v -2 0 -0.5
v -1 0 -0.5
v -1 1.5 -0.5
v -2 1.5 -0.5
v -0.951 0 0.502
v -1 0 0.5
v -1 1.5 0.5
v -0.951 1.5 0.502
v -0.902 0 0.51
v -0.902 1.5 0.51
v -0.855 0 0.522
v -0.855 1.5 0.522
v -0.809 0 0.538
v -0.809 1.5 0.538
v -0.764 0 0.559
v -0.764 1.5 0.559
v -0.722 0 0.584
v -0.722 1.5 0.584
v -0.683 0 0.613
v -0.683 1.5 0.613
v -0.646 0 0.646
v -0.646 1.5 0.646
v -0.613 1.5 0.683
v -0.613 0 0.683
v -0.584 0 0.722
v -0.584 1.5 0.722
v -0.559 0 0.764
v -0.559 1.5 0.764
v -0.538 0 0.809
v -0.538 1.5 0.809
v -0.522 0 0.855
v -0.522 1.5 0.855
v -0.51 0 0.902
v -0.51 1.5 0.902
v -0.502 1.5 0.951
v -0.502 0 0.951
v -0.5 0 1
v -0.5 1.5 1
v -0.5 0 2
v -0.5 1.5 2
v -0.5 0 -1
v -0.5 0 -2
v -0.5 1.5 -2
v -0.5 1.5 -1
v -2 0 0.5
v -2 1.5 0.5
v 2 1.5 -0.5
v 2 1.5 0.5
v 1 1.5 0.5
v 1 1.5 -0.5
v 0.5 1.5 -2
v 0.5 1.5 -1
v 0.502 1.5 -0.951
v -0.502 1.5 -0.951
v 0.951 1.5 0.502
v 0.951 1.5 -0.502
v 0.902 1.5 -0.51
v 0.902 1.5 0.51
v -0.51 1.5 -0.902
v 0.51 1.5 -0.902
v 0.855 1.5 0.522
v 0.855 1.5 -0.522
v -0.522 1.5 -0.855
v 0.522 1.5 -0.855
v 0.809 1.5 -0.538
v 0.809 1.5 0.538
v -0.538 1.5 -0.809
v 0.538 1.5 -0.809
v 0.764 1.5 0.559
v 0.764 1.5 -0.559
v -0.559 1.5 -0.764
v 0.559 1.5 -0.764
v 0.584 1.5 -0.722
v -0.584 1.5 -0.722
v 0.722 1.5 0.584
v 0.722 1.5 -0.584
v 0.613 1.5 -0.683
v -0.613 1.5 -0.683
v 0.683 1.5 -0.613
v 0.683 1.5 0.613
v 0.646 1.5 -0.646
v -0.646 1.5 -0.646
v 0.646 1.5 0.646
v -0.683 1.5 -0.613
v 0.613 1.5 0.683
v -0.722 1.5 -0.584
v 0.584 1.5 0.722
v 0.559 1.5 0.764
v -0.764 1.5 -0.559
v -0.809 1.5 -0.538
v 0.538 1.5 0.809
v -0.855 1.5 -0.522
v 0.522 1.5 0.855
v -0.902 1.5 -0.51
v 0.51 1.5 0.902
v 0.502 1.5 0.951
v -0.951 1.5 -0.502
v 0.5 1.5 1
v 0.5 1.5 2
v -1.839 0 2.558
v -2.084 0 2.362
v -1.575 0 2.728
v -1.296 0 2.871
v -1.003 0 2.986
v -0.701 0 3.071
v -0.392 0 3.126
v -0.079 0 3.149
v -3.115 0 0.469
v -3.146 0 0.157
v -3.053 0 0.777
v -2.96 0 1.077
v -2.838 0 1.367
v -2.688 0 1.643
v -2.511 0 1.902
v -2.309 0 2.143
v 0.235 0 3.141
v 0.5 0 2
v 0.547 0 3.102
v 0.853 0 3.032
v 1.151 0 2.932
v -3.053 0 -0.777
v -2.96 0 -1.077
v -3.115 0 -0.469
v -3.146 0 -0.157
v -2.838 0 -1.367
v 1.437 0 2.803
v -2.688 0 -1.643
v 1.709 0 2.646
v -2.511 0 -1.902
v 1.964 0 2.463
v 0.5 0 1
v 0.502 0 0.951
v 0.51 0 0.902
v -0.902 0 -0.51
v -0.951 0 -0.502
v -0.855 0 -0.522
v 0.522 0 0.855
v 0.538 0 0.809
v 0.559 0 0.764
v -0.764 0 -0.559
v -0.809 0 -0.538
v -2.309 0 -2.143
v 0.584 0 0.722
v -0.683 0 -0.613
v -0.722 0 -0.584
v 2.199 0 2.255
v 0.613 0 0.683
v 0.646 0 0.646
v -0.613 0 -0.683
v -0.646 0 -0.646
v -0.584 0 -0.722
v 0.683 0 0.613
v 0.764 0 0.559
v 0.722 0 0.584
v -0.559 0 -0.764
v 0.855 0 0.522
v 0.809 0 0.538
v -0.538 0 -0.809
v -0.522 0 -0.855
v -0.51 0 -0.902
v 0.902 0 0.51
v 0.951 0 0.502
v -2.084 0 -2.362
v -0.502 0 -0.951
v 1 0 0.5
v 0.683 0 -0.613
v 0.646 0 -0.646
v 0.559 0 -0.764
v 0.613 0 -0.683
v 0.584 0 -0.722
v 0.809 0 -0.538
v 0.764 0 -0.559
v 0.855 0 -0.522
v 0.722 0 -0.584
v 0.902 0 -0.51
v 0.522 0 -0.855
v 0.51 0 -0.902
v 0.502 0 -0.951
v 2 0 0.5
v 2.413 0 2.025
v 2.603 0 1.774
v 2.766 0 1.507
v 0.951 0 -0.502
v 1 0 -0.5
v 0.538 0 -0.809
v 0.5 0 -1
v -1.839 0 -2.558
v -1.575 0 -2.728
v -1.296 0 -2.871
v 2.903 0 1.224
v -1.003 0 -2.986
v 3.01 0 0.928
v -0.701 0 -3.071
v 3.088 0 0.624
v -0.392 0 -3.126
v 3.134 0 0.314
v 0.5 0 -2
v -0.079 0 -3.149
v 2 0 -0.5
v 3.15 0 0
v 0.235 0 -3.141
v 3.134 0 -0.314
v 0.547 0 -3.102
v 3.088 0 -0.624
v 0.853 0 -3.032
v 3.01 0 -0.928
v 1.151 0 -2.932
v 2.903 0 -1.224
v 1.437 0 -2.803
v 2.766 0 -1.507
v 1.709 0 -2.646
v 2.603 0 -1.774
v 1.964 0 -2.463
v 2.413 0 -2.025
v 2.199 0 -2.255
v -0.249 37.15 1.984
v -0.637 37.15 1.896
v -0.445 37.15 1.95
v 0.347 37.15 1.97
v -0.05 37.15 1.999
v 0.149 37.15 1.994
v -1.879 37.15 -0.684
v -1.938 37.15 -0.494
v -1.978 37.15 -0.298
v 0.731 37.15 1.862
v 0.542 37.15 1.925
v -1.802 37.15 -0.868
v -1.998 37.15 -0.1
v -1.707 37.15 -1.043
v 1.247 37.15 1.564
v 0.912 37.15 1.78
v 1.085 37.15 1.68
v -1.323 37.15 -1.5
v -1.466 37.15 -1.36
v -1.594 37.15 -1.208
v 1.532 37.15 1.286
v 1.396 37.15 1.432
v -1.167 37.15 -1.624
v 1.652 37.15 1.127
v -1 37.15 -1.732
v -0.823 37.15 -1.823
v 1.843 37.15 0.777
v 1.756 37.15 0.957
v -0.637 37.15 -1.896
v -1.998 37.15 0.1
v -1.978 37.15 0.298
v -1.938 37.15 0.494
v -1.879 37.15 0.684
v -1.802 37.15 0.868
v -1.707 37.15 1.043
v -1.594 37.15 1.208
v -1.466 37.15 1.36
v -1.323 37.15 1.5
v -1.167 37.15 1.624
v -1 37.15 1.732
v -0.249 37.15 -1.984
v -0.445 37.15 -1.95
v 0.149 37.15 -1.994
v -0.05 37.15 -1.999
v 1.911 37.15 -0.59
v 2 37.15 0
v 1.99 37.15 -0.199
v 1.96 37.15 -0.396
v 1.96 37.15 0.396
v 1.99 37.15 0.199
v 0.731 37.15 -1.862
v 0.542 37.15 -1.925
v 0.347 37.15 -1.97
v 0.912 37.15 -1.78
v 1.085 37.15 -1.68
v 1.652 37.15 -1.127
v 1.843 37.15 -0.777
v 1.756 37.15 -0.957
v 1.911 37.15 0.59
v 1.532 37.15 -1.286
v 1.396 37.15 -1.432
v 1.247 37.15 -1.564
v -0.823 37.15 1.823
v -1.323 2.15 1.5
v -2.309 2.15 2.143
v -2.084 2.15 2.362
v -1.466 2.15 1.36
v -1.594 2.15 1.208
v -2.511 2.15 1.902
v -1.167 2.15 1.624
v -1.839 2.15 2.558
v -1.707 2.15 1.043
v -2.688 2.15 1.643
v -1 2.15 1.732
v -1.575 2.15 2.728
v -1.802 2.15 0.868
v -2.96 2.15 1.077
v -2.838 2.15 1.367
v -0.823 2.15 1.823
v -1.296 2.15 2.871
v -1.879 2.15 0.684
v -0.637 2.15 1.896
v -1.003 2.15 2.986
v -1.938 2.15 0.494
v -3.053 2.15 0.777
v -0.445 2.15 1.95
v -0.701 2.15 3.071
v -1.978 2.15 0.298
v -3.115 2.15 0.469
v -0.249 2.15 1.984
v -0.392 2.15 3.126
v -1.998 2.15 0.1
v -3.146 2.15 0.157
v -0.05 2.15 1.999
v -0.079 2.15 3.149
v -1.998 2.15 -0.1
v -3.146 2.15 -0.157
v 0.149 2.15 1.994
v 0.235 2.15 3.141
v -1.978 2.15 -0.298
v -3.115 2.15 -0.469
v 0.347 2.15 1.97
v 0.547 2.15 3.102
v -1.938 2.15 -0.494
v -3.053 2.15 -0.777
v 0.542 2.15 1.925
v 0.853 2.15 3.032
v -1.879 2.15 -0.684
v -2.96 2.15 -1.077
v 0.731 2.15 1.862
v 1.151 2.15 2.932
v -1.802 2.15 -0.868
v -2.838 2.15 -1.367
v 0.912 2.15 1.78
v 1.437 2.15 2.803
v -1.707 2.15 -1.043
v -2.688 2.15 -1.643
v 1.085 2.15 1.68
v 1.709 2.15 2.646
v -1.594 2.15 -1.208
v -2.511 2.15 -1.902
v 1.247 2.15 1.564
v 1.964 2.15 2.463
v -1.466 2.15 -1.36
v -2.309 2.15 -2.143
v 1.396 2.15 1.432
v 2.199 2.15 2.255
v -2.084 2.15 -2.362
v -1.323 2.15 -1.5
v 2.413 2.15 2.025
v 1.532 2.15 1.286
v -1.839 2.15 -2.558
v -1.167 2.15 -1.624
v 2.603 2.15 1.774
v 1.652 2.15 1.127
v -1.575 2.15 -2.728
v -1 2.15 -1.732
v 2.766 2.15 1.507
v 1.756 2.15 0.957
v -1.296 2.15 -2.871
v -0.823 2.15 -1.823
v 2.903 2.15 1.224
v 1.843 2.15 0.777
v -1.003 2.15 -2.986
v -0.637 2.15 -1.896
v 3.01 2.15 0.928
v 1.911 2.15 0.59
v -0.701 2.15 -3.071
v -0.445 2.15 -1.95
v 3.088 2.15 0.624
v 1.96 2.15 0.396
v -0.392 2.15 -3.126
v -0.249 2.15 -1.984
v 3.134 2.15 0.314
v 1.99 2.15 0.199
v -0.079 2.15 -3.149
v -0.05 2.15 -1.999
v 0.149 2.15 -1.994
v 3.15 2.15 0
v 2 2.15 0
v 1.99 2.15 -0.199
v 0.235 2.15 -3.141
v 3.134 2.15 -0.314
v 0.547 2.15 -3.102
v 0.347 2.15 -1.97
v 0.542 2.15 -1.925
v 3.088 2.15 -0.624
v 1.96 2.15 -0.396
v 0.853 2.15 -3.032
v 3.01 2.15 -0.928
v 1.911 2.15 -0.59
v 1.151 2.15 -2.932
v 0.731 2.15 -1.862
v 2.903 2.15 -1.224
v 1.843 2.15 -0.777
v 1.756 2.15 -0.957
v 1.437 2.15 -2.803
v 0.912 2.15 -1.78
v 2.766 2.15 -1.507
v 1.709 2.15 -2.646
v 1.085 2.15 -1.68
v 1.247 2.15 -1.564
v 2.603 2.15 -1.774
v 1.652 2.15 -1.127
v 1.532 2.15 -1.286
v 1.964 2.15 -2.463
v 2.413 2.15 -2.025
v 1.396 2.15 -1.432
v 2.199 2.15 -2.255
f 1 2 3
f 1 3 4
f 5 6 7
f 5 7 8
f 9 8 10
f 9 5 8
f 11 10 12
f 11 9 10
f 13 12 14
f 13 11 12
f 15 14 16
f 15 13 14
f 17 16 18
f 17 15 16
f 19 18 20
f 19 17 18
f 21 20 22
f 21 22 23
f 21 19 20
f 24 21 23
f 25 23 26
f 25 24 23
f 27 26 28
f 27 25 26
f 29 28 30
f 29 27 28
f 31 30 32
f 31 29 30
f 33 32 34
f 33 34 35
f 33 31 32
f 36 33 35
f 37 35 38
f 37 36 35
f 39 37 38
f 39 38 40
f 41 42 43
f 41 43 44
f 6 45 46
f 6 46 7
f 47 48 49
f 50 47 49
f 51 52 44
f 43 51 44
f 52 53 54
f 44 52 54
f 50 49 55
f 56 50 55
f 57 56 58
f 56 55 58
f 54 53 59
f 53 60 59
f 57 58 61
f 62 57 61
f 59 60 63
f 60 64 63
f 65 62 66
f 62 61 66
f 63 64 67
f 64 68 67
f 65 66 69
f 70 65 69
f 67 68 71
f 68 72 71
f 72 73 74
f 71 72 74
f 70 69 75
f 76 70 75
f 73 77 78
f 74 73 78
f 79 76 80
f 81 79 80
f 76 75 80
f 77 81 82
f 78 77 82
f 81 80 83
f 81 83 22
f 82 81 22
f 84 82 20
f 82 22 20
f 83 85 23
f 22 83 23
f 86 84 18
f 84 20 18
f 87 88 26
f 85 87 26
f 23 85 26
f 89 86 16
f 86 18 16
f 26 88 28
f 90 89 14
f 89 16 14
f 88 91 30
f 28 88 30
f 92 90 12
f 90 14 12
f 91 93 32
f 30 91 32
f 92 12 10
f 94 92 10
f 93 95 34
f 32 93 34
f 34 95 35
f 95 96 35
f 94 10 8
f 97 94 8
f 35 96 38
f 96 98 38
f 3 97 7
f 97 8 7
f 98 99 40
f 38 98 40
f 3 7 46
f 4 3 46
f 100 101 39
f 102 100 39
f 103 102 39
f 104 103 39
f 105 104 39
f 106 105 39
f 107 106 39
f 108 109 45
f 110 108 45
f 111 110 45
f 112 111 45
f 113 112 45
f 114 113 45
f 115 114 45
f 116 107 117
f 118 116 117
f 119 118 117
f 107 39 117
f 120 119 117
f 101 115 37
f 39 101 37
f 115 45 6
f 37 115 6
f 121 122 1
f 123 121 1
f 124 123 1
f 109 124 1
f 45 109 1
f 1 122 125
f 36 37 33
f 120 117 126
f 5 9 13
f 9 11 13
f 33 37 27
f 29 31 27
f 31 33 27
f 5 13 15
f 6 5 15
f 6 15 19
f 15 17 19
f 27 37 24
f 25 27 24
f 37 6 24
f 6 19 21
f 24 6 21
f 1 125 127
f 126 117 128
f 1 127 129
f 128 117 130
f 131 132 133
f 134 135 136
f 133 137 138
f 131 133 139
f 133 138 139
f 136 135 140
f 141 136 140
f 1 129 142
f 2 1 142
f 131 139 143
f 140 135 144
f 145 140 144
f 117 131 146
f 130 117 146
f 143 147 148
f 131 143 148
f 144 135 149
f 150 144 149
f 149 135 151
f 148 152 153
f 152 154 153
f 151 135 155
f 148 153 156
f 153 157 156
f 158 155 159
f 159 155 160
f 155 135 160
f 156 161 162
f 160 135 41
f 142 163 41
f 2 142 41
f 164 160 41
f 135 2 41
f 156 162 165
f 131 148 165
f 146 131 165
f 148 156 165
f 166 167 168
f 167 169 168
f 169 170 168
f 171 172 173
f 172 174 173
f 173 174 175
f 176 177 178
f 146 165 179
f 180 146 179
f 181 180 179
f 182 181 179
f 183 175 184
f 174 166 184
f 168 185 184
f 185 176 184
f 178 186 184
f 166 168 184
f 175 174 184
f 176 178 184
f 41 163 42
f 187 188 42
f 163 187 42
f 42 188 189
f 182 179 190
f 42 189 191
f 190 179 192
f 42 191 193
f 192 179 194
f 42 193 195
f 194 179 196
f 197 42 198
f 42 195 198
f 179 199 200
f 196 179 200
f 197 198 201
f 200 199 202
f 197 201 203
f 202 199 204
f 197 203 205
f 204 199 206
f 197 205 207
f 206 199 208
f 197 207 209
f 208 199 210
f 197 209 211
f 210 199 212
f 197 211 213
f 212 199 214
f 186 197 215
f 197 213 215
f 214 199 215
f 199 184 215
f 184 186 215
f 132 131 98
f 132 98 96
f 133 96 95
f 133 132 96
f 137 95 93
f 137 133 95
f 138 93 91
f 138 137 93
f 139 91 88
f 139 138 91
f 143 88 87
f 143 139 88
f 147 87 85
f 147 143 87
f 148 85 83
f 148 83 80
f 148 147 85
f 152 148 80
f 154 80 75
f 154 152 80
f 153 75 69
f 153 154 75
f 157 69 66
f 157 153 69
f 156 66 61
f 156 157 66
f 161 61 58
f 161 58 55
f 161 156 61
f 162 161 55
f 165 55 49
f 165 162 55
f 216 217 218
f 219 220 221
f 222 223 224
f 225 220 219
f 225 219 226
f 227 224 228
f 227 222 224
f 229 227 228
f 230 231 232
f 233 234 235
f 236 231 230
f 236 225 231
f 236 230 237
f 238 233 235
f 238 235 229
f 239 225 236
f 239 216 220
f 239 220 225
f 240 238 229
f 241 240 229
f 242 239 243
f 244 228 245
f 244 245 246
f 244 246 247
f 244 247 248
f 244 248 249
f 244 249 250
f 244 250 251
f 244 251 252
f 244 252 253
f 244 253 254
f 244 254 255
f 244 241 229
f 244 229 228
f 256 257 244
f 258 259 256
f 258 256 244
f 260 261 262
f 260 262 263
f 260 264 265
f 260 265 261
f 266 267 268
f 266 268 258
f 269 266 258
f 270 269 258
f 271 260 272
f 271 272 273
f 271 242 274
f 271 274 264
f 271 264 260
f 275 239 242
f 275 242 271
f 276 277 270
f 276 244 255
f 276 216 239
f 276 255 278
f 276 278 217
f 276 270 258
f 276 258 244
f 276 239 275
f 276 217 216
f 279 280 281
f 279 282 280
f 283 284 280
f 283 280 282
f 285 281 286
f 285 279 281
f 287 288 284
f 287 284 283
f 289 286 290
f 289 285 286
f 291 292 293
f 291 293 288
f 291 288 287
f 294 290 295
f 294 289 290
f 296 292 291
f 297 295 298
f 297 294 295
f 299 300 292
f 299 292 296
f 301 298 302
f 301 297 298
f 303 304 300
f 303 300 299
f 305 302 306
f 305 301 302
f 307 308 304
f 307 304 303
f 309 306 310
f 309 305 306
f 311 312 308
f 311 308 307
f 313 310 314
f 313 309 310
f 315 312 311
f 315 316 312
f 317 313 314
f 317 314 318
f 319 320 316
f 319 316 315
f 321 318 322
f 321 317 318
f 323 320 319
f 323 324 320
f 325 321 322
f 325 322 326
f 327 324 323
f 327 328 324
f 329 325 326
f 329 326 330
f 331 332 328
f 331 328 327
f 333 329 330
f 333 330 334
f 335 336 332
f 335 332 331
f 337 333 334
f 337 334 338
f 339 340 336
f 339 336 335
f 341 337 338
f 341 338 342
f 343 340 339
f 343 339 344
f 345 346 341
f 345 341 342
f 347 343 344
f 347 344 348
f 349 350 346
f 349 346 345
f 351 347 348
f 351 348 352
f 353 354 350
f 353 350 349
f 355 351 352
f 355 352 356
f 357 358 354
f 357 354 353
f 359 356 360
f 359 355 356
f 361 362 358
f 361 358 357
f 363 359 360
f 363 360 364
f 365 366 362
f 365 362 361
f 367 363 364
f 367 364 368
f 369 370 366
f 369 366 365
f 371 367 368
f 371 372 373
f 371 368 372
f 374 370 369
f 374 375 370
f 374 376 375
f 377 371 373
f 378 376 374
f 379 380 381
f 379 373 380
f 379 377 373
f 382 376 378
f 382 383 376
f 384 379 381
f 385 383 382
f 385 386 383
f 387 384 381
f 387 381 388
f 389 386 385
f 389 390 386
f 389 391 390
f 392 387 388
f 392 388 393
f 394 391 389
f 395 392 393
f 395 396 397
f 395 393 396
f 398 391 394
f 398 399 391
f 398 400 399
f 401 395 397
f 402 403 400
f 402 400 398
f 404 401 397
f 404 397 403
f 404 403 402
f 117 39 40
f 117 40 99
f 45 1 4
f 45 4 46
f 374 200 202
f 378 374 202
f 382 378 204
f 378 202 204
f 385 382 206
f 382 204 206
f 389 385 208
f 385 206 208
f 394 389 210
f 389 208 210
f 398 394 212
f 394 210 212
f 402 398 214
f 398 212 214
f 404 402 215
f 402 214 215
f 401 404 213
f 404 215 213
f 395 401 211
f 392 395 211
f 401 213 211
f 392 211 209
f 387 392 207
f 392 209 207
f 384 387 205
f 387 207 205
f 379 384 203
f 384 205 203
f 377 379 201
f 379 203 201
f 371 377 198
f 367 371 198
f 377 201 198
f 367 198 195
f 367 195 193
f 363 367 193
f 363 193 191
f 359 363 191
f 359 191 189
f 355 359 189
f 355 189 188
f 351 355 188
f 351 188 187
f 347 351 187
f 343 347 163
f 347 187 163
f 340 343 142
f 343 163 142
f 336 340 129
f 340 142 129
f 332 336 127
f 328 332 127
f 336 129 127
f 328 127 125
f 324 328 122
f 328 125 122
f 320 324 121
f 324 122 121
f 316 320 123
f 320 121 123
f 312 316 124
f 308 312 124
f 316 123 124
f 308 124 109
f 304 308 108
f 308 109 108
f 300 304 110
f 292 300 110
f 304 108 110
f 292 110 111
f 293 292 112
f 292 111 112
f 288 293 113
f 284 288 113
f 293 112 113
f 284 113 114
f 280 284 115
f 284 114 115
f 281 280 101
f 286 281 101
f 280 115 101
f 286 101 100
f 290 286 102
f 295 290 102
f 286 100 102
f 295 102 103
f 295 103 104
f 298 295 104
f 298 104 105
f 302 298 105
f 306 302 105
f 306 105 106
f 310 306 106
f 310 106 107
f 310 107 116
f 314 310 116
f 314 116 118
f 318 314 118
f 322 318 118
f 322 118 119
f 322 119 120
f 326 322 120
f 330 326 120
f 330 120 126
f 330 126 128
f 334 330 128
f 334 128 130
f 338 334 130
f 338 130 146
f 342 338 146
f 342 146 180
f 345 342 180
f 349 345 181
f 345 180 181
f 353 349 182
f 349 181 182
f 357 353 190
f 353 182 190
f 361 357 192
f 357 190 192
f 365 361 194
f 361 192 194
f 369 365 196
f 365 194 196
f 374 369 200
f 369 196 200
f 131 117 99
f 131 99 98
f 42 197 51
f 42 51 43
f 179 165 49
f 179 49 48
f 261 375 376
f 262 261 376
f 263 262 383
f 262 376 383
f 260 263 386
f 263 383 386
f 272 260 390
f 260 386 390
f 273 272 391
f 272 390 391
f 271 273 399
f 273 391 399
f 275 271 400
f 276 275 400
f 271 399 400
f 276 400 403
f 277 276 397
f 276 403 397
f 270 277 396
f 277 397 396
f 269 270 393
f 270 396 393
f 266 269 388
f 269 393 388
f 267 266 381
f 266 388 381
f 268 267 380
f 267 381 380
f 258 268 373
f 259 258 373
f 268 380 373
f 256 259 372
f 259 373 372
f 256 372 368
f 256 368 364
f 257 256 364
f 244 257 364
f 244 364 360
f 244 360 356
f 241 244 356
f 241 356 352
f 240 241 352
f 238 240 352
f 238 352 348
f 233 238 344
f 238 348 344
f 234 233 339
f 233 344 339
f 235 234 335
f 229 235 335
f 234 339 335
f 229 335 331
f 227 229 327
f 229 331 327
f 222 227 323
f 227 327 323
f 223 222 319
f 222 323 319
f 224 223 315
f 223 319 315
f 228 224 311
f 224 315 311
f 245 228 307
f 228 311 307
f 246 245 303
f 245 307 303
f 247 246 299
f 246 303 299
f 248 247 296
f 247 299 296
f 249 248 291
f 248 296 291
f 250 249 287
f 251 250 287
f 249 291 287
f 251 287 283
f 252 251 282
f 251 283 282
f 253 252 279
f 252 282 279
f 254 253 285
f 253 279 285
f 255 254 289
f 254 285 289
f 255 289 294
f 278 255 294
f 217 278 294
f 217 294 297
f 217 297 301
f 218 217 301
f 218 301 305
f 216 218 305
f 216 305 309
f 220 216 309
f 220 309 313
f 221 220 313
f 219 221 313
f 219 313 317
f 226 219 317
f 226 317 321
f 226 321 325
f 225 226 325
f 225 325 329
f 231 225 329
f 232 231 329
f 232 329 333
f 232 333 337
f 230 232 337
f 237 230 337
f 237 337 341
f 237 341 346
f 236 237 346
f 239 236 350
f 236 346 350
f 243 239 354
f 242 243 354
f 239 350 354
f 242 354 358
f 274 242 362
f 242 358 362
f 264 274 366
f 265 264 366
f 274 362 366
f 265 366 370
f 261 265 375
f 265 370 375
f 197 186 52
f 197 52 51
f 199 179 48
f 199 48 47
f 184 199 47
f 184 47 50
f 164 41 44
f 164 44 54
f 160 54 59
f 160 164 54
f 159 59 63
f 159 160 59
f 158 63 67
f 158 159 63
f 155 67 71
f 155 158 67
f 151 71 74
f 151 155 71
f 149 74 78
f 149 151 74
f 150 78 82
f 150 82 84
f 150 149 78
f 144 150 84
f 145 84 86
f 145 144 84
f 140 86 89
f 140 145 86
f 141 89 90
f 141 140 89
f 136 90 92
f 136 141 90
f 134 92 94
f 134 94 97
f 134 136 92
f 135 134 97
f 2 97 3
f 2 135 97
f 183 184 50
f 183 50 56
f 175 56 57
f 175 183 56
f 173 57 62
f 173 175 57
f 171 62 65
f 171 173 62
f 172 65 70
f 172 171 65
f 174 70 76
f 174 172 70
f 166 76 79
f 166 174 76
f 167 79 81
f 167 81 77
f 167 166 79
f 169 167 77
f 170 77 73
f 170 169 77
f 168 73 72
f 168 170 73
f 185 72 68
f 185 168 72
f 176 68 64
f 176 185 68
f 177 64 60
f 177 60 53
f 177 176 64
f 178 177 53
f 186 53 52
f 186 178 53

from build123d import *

# Parameters (mm, degrees)
SKETCH_1_R          = 3.15
EXTRUDE_1_DEPTH     = 2.15
SKETCH_2_R          = 2
EXTRUDE_2_DEPTH     = 35
CUT_EXTRUDE_1_DEPTH = 1.5


with BuildPart() as part:
    # 草图1 → 凸台-拉伸1 (new body)
    with BuildSketch(Plane(origin=(0, 0, 0), x_dir=(1, 0, 0), z_dir=(0, 1, 0))):
        Circle(SKETCH_1_R)
    extrude(amount=EXTRUDE_1_DEPTH)

    # 草图2 → 凸台-拉伸2 (add)
    with BuildSketch(Plane(origin=(0, 2.15, 0), x_dir=(1, 0, 0), z_dir=(0, 1, 0))):
        Circle(SKETCH_2_R)
    extrude(amount=EXTRUDE_2_DEPTH)

    # 草图3 → 切除-拉伸1 (cut)
    with BuildSketch(Plane.XZ):
        with BuildLine():
            Line((-0.5, 1), (-0.5, 2))
            Line((-0.5, 2), (0.5, 2))
            Line((0.5, 2), (0.5, 1))
            ThreePointArc((0.5, 1), (0.646446609, 0.646446609), (1, 0.5))
            Line((1, 0.5), (2, 0.5))
            Line((2, 0.5), (2, -0.5))
            Line((2, -0.5), (1, -0.5))
            ThreePointArc((1, -0.5), (0.646446609, -0.646446609), (0.5, -1))
            Line((0.5, -1), (0.5, -2))
            Line((0.5, -2), (-0.5, -2))
            Line((-0.5, -2), (-0.5, -1))
            ThreePointArc((-0.5, -1), (-0.646446609, -0.646446609), (-1, -0.5))
            Line((-1, -0.5), (-2, -0.5))
            Line((-2, -0.5), (-2, 0.5))
            Line((-2, 0.5), (-1, 0.5))
            ThreePointArc((-1, 0.5), (-0.646446609, 0.646446609), (-0.5, 1))
        make_face()
    extrude(amount=-CUT_EXTRUDE_1_DEPTH, mode=Mode.SUBTRACT)


solid = part.part
